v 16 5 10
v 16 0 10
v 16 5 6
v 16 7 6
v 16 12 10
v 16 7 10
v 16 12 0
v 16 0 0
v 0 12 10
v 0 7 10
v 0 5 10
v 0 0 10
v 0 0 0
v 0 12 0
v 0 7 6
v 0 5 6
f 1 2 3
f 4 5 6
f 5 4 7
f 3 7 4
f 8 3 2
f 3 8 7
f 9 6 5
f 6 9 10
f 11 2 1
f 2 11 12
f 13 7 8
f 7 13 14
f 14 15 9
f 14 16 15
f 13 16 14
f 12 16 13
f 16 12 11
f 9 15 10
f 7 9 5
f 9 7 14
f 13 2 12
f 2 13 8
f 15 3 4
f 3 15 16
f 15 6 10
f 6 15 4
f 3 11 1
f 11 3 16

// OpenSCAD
$fn = 32;

// ----------------------------------------------------------------------
// Micro clip: slotted block, 5-20 mm class
// ----------------------------------------------------------------------

// --- parameters (mm) ---
block_l = 16;             // block length, X
block_w = 12;             // block width, Y
block_h = 10;             // block height, Z
slot_w = 2;               // slot width
slot_d = 4;               // slot depth from the top

difference() {
  cube([block_l, block_w, block_h]);
  translate([-1, block_w / 2 - slot_w / 2, block_h - slot_d])
    cube([block_l + 2, slot_w, slot_d + 1]);
}
